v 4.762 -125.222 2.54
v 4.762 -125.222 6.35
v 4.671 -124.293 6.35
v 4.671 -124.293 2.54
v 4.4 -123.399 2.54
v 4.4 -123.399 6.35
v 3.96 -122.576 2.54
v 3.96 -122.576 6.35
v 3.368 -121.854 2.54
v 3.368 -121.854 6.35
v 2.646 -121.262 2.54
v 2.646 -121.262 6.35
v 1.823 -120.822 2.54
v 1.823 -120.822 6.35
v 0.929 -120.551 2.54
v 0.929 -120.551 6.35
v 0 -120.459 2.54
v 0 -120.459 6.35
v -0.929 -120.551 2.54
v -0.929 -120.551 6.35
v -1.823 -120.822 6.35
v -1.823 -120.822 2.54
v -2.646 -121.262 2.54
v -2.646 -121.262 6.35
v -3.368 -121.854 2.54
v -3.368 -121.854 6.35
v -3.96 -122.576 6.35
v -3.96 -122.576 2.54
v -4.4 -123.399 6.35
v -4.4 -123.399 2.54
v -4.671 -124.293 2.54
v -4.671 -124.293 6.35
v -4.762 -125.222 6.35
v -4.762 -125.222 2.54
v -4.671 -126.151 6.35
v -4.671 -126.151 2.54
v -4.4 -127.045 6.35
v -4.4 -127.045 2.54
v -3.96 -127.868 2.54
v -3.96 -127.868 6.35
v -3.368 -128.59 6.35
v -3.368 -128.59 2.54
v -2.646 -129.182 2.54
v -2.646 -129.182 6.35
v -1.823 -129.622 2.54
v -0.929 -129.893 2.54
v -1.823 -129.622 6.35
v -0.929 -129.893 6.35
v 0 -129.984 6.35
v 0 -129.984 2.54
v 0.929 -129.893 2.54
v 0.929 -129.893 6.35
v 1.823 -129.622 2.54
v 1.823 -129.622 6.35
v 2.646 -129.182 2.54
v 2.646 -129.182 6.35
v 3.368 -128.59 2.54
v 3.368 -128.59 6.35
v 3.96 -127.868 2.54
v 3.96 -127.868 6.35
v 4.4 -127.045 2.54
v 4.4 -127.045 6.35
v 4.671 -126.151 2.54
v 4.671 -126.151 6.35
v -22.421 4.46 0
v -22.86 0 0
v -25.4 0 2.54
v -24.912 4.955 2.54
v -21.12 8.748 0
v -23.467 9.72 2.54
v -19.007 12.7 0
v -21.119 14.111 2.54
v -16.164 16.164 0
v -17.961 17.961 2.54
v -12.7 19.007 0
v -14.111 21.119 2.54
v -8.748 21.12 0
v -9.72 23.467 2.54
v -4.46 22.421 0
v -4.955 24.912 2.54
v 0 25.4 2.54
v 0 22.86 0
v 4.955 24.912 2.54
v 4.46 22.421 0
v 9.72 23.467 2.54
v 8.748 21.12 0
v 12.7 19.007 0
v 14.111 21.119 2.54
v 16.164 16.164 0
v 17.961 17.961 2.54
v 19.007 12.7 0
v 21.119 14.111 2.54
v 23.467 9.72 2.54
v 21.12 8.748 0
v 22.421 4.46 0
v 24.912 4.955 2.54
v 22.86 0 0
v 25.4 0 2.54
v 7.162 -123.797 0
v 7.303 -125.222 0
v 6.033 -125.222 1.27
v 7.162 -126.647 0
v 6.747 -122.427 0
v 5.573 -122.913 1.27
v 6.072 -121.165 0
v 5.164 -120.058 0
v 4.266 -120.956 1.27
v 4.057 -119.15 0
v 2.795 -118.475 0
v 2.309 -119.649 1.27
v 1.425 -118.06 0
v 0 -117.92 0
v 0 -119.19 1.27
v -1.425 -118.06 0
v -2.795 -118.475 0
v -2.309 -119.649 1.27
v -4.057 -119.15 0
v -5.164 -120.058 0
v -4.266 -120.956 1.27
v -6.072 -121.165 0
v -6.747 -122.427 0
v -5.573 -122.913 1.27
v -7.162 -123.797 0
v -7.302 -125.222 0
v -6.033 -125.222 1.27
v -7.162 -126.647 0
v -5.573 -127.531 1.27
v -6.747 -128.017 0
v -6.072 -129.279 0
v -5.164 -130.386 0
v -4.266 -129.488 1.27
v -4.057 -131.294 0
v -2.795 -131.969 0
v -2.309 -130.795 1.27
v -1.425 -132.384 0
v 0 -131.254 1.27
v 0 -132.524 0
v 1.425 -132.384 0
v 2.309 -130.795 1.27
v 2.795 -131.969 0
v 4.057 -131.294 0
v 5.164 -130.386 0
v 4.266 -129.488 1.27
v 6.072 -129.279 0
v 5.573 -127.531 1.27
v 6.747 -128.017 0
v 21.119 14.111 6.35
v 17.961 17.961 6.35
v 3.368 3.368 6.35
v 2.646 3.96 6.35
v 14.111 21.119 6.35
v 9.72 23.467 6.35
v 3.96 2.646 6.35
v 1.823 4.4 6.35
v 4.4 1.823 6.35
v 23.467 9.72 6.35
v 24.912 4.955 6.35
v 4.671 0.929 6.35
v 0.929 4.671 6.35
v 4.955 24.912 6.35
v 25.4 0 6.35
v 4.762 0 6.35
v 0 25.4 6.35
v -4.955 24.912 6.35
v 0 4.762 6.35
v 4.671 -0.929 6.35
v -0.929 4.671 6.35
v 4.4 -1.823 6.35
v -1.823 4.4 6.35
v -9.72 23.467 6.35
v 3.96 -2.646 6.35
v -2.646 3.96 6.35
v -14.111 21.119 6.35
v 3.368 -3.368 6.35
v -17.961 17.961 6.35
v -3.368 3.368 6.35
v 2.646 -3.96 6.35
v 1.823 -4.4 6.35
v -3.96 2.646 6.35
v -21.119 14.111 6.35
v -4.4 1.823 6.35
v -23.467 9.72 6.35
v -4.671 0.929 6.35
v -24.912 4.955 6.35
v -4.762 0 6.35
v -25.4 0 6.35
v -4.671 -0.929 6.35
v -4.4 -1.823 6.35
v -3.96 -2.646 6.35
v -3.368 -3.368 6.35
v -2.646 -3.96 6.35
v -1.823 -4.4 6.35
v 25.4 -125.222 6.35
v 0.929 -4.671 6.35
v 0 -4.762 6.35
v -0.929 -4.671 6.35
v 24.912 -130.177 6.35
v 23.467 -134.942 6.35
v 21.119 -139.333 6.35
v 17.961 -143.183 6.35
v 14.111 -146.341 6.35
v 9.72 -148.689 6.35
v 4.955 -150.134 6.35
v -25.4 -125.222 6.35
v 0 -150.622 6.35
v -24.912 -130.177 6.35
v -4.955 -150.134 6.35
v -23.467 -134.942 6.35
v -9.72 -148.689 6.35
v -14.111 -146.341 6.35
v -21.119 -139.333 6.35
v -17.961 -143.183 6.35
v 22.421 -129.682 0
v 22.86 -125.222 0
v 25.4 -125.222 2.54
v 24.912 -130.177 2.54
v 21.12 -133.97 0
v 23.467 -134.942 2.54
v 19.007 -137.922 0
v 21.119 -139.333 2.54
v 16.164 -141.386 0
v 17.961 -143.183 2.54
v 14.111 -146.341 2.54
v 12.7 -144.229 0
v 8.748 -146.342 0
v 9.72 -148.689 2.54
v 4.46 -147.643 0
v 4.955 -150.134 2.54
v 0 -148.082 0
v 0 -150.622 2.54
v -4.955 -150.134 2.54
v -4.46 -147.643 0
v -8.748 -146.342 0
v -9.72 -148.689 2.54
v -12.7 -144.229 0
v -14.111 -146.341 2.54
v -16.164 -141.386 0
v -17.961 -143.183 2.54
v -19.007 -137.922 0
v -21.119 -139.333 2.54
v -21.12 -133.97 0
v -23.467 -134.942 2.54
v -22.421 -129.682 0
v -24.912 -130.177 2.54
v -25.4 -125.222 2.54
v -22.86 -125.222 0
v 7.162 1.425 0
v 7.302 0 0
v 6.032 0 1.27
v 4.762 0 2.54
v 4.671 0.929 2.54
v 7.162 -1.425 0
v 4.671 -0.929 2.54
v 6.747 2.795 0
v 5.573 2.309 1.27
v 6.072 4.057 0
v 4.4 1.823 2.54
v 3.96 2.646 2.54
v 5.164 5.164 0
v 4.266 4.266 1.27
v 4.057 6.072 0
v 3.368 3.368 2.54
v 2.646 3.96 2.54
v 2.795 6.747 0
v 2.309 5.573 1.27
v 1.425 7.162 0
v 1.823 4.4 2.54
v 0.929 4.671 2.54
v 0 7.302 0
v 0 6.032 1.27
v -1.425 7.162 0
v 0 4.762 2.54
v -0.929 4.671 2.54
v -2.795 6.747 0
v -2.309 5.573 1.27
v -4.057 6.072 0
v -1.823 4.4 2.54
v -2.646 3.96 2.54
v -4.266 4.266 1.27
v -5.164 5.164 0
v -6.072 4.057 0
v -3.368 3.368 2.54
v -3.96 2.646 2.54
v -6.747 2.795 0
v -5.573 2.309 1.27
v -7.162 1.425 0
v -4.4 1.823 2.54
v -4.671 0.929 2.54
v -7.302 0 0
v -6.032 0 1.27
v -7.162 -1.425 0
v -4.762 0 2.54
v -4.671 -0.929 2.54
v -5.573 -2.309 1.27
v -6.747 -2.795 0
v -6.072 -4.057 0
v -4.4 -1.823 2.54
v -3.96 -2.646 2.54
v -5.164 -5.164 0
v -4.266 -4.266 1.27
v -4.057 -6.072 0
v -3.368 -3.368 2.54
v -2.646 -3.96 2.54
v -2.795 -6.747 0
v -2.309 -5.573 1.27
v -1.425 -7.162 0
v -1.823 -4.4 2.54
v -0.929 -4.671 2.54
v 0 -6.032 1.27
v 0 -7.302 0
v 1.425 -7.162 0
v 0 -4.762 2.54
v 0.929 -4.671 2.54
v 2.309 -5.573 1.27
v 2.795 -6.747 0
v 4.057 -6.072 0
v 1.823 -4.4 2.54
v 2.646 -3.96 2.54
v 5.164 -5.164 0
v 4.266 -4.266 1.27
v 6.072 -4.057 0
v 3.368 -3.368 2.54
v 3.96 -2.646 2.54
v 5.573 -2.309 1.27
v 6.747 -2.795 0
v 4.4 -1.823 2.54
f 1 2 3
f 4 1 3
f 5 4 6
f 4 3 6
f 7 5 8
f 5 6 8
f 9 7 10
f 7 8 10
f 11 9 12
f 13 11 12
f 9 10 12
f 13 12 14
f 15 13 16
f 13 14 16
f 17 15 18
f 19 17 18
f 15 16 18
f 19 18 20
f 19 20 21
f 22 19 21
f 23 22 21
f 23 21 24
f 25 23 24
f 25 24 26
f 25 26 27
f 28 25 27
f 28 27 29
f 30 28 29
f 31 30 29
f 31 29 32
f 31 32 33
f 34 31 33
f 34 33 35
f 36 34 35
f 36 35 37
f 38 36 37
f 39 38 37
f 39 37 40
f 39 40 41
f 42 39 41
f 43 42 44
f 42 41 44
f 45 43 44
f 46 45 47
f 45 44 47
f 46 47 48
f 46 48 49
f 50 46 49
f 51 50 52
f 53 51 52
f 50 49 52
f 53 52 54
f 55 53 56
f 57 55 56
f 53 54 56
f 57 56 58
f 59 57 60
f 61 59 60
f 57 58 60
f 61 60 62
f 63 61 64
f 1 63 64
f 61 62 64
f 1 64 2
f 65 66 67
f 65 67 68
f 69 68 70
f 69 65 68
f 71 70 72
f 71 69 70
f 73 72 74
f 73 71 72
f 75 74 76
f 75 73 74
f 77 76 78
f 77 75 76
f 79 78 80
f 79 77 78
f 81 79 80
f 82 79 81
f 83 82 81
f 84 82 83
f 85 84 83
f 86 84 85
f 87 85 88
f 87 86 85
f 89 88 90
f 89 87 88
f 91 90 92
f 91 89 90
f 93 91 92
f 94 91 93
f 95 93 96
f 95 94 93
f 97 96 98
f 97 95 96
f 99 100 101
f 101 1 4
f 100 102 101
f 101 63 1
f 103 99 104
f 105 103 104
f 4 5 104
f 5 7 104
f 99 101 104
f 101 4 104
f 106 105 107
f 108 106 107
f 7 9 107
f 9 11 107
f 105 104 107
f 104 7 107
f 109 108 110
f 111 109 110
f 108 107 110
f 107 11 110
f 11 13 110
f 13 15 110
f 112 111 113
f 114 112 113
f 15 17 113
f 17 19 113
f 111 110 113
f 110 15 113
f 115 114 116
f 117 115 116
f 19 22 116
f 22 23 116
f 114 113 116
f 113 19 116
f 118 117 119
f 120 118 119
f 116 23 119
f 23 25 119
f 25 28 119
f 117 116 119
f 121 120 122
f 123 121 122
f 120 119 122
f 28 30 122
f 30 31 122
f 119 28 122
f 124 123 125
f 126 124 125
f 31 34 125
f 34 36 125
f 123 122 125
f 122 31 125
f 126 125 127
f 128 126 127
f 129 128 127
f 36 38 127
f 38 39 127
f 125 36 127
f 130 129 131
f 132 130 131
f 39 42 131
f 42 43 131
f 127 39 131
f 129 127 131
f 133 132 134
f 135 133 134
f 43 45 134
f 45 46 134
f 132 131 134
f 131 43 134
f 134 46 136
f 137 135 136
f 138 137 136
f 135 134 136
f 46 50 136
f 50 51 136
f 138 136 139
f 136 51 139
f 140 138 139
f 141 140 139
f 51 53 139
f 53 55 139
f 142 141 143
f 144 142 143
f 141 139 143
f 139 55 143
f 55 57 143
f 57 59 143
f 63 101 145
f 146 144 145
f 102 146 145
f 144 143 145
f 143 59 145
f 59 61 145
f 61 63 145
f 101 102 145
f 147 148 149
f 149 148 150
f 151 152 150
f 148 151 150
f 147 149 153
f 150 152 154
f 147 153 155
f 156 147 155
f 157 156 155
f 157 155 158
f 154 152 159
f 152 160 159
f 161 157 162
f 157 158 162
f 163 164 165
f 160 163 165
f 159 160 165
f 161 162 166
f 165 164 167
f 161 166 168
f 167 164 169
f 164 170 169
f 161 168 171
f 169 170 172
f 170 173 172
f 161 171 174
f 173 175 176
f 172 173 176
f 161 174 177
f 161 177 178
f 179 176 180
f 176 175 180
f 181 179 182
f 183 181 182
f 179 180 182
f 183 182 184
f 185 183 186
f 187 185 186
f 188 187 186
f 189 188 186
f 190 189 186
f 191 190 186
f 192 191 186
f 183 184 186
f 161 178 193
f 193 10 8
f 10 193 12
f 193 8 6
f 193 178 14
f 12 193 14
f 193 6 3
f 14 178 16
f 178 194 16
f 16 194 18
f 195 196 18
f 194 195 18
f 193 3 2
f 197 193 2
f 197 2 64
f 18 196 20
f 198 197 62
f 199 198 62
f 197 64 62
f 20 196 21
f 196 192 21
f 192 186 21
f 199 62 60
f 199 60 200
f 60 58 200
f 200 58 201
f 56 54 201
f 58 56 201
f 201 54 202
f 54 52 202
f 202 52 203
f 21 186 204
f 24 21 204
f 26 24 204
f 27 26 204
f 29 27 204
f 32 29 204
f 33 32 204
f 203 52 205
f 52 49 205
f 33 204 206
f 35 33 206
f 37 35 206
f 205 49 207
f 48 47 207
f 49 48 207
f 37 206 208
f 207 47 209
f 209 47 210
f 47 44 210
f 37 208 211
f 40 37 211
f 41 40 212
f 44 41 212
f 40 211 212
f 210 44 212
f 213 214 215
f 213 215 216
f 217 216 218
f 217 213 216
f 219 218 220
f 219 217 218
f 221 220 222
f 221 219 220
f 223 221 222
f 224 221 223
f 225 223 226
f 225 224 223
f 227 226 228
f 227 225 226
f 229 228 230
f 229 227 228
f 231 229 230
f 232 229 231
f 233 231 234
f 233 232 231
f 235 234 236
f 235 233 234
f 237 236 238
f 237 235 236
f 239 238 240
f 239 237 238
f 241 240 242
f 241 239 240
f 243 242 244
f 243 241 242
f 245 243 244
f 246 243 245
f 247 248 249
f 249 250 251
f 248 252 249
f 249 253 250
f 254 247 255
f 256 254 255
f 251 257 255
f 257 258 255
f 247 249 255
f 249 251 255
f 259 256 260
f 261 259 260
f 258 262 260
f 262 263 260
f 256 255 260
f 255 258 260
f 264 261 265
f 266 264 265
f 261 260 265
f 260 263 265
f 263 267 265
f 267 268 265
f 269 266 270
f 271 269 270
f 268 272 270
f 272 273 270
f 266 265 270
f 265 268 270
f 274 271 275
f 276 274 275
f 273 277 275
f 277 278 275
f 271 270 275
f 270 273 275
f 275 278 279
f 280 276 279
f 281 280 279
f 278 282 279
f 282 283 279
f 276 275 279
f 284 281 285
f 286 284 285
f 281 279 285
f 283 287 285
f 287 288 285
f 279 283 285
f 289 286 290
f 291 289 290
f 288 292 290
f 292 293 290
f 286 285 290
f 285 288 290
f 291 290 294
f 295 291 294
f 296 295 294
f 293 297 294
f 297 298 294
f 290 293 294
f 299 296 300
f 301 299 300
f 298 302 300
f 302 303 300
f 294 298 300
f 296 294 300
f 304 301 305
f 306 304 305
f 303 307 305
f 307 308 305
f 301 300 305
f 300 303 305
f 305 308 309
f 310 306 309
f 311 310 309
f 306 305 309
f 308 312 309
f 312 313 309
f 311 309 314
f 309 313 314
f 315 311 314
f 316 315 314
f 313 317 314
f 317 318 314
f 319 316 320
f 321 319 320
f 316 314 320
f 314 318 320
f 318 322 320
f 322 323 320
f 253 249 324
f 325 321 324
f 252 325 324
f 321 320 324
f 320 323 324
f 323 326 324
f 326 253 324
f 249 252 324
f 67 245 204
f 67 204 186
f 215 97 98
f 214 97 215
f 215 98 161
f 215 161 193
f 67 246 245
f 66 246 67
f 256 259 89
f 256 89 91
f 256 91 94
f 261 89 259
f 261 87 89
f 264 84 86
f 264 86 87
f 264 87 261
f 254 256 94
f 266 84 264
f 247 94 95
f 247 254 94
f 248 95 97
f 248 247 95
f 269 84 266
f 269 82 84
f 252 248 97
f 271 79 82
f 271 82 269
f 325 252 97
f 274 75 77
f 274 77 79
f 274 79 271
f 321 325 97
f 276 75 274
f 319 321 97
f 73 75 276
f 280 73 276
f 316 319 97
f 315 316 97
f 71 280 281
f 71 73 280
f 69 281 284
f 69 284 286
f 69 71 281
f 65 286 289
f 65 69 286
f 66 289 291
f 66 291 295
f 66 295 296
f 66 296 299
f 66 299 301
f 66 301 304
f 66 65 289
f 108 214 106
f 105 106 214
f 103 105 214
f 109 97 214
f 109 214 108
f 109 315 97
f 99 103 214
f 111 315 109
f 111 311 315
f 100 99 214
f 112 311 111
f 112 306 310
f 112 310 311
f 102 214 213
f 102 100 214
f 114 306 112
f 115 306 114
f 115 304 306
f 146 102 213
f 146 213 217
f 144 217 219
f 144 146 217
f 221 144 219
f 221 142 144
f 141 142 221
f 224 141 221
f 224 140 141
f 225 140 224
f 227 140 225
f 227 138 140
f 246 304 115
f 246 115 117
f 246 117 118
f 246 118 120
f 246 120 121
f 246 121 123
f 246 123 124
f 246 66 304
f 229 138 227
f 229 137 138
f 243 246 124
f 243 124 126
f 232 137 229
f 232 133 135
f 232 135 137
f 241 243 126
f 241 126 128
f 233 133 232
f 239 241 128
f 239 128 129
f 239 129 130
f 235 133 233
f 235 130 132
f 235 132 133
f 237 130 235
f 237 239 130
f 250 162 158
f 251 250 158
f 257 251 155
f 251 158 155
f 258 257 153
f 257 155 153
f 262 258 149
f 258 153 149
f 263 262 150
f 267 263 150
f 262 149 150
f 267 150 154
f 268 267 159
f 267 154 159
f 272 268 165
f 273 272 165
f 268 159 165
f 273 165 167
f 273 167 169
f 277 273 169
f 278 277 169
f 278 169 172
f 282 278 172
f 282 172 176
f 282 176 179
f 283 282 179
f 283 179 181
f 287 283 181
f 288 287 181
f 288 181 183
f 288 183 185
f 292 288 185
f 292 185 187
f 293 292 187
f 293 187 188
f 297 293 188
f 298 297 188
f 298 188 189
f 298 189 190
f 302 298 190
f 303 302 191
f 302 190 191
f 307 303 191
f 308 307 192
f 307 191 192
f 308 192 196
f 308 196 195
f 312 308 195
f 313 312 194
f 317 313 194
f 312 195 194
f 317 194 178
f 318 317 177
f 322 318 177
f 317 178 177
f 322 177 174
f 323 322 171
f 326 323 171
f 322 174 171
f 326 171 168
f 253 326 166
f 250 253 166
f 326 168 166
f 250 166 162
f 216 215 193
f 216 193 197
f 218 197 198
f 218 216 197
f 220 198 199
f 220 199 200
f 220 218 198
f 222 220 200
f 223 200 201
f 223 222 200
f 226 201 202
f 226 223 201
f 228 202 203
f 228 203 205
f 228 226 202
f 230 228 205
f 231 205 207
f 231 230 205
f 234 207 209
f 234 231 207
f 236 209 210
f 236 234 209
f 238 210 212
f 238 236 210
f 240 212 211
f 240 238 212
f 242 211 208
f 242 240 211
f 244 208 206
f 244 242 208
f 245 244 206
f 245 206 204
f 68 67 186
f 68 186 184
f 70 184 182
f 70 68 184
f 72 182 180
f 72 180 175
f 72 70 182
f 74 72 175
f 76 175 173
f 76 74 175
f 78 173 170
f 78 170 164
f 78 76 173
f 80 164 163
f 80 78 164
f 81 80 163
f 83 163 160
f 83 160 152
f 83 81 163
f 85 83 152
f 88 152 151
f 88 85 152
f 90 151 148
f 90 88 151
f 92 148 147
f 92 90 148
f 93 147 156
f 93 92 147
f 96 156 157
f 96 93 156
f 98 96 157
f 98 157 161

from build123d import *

# Parameters (mm, degrees)
BOSS_EXTRUDE1_DEPTH = 6.35
SKETCH2_R           = 4.7625
CUT_EXTRUDE1_DEPTH  = 153.880572291
CHAMFER1_SIZE       = 2.54


with BuildPart() as part:
    # Sketch1 → Boss-Extrude1 (new body)
    with BuildSketch(Plane(origin=(0, 0, 0), x_dir=(0, 1, 0), z_dir=(0, 0, 1))):
        with BuildLine():
            Line((0, -25.4), (-125.222, -25.4))
            ThreePointArc((-125.222, -25.4), (-150.622, 0), (-125.222, 25.4))
            Line((-125.222, 25.4), (0, 25.4))
            ThreePointArc((0, 25.4), (25.4, 0), (0, -25.4))
        make_face()
    extrude(amount=BOSS_EXTRUDE1_DEPTH)

    # Sketch2 → Cut-Extrude1 (cut, through all)
    with BuildSketch(Plane.XY.offset(6.35)):
        Circle(SKETCH2_R)
        with Locations((0, -125.222)):
            Circle(SKETCH2_R)
    extrude(amount=-CUT_EXTRUDE1_DEPTH, mode=Mode.SUBTRACT)

    # Chamfer1
    chamfer1_edges = [part.edges().sort_by_distance(p)[0] for p in [
        (-4.7625, 0, 0),
        (-4.7625, -125.222, 0),
        (0, 25.4, 0),
        (25.4, -62.611, 0),
        (0, -150.622, 0),
        (-25.4, -62.611, 0),
    ]]
    chamfer(chamfer1_edges, length=CHAMFER1_SIZE)


solid = part.part
